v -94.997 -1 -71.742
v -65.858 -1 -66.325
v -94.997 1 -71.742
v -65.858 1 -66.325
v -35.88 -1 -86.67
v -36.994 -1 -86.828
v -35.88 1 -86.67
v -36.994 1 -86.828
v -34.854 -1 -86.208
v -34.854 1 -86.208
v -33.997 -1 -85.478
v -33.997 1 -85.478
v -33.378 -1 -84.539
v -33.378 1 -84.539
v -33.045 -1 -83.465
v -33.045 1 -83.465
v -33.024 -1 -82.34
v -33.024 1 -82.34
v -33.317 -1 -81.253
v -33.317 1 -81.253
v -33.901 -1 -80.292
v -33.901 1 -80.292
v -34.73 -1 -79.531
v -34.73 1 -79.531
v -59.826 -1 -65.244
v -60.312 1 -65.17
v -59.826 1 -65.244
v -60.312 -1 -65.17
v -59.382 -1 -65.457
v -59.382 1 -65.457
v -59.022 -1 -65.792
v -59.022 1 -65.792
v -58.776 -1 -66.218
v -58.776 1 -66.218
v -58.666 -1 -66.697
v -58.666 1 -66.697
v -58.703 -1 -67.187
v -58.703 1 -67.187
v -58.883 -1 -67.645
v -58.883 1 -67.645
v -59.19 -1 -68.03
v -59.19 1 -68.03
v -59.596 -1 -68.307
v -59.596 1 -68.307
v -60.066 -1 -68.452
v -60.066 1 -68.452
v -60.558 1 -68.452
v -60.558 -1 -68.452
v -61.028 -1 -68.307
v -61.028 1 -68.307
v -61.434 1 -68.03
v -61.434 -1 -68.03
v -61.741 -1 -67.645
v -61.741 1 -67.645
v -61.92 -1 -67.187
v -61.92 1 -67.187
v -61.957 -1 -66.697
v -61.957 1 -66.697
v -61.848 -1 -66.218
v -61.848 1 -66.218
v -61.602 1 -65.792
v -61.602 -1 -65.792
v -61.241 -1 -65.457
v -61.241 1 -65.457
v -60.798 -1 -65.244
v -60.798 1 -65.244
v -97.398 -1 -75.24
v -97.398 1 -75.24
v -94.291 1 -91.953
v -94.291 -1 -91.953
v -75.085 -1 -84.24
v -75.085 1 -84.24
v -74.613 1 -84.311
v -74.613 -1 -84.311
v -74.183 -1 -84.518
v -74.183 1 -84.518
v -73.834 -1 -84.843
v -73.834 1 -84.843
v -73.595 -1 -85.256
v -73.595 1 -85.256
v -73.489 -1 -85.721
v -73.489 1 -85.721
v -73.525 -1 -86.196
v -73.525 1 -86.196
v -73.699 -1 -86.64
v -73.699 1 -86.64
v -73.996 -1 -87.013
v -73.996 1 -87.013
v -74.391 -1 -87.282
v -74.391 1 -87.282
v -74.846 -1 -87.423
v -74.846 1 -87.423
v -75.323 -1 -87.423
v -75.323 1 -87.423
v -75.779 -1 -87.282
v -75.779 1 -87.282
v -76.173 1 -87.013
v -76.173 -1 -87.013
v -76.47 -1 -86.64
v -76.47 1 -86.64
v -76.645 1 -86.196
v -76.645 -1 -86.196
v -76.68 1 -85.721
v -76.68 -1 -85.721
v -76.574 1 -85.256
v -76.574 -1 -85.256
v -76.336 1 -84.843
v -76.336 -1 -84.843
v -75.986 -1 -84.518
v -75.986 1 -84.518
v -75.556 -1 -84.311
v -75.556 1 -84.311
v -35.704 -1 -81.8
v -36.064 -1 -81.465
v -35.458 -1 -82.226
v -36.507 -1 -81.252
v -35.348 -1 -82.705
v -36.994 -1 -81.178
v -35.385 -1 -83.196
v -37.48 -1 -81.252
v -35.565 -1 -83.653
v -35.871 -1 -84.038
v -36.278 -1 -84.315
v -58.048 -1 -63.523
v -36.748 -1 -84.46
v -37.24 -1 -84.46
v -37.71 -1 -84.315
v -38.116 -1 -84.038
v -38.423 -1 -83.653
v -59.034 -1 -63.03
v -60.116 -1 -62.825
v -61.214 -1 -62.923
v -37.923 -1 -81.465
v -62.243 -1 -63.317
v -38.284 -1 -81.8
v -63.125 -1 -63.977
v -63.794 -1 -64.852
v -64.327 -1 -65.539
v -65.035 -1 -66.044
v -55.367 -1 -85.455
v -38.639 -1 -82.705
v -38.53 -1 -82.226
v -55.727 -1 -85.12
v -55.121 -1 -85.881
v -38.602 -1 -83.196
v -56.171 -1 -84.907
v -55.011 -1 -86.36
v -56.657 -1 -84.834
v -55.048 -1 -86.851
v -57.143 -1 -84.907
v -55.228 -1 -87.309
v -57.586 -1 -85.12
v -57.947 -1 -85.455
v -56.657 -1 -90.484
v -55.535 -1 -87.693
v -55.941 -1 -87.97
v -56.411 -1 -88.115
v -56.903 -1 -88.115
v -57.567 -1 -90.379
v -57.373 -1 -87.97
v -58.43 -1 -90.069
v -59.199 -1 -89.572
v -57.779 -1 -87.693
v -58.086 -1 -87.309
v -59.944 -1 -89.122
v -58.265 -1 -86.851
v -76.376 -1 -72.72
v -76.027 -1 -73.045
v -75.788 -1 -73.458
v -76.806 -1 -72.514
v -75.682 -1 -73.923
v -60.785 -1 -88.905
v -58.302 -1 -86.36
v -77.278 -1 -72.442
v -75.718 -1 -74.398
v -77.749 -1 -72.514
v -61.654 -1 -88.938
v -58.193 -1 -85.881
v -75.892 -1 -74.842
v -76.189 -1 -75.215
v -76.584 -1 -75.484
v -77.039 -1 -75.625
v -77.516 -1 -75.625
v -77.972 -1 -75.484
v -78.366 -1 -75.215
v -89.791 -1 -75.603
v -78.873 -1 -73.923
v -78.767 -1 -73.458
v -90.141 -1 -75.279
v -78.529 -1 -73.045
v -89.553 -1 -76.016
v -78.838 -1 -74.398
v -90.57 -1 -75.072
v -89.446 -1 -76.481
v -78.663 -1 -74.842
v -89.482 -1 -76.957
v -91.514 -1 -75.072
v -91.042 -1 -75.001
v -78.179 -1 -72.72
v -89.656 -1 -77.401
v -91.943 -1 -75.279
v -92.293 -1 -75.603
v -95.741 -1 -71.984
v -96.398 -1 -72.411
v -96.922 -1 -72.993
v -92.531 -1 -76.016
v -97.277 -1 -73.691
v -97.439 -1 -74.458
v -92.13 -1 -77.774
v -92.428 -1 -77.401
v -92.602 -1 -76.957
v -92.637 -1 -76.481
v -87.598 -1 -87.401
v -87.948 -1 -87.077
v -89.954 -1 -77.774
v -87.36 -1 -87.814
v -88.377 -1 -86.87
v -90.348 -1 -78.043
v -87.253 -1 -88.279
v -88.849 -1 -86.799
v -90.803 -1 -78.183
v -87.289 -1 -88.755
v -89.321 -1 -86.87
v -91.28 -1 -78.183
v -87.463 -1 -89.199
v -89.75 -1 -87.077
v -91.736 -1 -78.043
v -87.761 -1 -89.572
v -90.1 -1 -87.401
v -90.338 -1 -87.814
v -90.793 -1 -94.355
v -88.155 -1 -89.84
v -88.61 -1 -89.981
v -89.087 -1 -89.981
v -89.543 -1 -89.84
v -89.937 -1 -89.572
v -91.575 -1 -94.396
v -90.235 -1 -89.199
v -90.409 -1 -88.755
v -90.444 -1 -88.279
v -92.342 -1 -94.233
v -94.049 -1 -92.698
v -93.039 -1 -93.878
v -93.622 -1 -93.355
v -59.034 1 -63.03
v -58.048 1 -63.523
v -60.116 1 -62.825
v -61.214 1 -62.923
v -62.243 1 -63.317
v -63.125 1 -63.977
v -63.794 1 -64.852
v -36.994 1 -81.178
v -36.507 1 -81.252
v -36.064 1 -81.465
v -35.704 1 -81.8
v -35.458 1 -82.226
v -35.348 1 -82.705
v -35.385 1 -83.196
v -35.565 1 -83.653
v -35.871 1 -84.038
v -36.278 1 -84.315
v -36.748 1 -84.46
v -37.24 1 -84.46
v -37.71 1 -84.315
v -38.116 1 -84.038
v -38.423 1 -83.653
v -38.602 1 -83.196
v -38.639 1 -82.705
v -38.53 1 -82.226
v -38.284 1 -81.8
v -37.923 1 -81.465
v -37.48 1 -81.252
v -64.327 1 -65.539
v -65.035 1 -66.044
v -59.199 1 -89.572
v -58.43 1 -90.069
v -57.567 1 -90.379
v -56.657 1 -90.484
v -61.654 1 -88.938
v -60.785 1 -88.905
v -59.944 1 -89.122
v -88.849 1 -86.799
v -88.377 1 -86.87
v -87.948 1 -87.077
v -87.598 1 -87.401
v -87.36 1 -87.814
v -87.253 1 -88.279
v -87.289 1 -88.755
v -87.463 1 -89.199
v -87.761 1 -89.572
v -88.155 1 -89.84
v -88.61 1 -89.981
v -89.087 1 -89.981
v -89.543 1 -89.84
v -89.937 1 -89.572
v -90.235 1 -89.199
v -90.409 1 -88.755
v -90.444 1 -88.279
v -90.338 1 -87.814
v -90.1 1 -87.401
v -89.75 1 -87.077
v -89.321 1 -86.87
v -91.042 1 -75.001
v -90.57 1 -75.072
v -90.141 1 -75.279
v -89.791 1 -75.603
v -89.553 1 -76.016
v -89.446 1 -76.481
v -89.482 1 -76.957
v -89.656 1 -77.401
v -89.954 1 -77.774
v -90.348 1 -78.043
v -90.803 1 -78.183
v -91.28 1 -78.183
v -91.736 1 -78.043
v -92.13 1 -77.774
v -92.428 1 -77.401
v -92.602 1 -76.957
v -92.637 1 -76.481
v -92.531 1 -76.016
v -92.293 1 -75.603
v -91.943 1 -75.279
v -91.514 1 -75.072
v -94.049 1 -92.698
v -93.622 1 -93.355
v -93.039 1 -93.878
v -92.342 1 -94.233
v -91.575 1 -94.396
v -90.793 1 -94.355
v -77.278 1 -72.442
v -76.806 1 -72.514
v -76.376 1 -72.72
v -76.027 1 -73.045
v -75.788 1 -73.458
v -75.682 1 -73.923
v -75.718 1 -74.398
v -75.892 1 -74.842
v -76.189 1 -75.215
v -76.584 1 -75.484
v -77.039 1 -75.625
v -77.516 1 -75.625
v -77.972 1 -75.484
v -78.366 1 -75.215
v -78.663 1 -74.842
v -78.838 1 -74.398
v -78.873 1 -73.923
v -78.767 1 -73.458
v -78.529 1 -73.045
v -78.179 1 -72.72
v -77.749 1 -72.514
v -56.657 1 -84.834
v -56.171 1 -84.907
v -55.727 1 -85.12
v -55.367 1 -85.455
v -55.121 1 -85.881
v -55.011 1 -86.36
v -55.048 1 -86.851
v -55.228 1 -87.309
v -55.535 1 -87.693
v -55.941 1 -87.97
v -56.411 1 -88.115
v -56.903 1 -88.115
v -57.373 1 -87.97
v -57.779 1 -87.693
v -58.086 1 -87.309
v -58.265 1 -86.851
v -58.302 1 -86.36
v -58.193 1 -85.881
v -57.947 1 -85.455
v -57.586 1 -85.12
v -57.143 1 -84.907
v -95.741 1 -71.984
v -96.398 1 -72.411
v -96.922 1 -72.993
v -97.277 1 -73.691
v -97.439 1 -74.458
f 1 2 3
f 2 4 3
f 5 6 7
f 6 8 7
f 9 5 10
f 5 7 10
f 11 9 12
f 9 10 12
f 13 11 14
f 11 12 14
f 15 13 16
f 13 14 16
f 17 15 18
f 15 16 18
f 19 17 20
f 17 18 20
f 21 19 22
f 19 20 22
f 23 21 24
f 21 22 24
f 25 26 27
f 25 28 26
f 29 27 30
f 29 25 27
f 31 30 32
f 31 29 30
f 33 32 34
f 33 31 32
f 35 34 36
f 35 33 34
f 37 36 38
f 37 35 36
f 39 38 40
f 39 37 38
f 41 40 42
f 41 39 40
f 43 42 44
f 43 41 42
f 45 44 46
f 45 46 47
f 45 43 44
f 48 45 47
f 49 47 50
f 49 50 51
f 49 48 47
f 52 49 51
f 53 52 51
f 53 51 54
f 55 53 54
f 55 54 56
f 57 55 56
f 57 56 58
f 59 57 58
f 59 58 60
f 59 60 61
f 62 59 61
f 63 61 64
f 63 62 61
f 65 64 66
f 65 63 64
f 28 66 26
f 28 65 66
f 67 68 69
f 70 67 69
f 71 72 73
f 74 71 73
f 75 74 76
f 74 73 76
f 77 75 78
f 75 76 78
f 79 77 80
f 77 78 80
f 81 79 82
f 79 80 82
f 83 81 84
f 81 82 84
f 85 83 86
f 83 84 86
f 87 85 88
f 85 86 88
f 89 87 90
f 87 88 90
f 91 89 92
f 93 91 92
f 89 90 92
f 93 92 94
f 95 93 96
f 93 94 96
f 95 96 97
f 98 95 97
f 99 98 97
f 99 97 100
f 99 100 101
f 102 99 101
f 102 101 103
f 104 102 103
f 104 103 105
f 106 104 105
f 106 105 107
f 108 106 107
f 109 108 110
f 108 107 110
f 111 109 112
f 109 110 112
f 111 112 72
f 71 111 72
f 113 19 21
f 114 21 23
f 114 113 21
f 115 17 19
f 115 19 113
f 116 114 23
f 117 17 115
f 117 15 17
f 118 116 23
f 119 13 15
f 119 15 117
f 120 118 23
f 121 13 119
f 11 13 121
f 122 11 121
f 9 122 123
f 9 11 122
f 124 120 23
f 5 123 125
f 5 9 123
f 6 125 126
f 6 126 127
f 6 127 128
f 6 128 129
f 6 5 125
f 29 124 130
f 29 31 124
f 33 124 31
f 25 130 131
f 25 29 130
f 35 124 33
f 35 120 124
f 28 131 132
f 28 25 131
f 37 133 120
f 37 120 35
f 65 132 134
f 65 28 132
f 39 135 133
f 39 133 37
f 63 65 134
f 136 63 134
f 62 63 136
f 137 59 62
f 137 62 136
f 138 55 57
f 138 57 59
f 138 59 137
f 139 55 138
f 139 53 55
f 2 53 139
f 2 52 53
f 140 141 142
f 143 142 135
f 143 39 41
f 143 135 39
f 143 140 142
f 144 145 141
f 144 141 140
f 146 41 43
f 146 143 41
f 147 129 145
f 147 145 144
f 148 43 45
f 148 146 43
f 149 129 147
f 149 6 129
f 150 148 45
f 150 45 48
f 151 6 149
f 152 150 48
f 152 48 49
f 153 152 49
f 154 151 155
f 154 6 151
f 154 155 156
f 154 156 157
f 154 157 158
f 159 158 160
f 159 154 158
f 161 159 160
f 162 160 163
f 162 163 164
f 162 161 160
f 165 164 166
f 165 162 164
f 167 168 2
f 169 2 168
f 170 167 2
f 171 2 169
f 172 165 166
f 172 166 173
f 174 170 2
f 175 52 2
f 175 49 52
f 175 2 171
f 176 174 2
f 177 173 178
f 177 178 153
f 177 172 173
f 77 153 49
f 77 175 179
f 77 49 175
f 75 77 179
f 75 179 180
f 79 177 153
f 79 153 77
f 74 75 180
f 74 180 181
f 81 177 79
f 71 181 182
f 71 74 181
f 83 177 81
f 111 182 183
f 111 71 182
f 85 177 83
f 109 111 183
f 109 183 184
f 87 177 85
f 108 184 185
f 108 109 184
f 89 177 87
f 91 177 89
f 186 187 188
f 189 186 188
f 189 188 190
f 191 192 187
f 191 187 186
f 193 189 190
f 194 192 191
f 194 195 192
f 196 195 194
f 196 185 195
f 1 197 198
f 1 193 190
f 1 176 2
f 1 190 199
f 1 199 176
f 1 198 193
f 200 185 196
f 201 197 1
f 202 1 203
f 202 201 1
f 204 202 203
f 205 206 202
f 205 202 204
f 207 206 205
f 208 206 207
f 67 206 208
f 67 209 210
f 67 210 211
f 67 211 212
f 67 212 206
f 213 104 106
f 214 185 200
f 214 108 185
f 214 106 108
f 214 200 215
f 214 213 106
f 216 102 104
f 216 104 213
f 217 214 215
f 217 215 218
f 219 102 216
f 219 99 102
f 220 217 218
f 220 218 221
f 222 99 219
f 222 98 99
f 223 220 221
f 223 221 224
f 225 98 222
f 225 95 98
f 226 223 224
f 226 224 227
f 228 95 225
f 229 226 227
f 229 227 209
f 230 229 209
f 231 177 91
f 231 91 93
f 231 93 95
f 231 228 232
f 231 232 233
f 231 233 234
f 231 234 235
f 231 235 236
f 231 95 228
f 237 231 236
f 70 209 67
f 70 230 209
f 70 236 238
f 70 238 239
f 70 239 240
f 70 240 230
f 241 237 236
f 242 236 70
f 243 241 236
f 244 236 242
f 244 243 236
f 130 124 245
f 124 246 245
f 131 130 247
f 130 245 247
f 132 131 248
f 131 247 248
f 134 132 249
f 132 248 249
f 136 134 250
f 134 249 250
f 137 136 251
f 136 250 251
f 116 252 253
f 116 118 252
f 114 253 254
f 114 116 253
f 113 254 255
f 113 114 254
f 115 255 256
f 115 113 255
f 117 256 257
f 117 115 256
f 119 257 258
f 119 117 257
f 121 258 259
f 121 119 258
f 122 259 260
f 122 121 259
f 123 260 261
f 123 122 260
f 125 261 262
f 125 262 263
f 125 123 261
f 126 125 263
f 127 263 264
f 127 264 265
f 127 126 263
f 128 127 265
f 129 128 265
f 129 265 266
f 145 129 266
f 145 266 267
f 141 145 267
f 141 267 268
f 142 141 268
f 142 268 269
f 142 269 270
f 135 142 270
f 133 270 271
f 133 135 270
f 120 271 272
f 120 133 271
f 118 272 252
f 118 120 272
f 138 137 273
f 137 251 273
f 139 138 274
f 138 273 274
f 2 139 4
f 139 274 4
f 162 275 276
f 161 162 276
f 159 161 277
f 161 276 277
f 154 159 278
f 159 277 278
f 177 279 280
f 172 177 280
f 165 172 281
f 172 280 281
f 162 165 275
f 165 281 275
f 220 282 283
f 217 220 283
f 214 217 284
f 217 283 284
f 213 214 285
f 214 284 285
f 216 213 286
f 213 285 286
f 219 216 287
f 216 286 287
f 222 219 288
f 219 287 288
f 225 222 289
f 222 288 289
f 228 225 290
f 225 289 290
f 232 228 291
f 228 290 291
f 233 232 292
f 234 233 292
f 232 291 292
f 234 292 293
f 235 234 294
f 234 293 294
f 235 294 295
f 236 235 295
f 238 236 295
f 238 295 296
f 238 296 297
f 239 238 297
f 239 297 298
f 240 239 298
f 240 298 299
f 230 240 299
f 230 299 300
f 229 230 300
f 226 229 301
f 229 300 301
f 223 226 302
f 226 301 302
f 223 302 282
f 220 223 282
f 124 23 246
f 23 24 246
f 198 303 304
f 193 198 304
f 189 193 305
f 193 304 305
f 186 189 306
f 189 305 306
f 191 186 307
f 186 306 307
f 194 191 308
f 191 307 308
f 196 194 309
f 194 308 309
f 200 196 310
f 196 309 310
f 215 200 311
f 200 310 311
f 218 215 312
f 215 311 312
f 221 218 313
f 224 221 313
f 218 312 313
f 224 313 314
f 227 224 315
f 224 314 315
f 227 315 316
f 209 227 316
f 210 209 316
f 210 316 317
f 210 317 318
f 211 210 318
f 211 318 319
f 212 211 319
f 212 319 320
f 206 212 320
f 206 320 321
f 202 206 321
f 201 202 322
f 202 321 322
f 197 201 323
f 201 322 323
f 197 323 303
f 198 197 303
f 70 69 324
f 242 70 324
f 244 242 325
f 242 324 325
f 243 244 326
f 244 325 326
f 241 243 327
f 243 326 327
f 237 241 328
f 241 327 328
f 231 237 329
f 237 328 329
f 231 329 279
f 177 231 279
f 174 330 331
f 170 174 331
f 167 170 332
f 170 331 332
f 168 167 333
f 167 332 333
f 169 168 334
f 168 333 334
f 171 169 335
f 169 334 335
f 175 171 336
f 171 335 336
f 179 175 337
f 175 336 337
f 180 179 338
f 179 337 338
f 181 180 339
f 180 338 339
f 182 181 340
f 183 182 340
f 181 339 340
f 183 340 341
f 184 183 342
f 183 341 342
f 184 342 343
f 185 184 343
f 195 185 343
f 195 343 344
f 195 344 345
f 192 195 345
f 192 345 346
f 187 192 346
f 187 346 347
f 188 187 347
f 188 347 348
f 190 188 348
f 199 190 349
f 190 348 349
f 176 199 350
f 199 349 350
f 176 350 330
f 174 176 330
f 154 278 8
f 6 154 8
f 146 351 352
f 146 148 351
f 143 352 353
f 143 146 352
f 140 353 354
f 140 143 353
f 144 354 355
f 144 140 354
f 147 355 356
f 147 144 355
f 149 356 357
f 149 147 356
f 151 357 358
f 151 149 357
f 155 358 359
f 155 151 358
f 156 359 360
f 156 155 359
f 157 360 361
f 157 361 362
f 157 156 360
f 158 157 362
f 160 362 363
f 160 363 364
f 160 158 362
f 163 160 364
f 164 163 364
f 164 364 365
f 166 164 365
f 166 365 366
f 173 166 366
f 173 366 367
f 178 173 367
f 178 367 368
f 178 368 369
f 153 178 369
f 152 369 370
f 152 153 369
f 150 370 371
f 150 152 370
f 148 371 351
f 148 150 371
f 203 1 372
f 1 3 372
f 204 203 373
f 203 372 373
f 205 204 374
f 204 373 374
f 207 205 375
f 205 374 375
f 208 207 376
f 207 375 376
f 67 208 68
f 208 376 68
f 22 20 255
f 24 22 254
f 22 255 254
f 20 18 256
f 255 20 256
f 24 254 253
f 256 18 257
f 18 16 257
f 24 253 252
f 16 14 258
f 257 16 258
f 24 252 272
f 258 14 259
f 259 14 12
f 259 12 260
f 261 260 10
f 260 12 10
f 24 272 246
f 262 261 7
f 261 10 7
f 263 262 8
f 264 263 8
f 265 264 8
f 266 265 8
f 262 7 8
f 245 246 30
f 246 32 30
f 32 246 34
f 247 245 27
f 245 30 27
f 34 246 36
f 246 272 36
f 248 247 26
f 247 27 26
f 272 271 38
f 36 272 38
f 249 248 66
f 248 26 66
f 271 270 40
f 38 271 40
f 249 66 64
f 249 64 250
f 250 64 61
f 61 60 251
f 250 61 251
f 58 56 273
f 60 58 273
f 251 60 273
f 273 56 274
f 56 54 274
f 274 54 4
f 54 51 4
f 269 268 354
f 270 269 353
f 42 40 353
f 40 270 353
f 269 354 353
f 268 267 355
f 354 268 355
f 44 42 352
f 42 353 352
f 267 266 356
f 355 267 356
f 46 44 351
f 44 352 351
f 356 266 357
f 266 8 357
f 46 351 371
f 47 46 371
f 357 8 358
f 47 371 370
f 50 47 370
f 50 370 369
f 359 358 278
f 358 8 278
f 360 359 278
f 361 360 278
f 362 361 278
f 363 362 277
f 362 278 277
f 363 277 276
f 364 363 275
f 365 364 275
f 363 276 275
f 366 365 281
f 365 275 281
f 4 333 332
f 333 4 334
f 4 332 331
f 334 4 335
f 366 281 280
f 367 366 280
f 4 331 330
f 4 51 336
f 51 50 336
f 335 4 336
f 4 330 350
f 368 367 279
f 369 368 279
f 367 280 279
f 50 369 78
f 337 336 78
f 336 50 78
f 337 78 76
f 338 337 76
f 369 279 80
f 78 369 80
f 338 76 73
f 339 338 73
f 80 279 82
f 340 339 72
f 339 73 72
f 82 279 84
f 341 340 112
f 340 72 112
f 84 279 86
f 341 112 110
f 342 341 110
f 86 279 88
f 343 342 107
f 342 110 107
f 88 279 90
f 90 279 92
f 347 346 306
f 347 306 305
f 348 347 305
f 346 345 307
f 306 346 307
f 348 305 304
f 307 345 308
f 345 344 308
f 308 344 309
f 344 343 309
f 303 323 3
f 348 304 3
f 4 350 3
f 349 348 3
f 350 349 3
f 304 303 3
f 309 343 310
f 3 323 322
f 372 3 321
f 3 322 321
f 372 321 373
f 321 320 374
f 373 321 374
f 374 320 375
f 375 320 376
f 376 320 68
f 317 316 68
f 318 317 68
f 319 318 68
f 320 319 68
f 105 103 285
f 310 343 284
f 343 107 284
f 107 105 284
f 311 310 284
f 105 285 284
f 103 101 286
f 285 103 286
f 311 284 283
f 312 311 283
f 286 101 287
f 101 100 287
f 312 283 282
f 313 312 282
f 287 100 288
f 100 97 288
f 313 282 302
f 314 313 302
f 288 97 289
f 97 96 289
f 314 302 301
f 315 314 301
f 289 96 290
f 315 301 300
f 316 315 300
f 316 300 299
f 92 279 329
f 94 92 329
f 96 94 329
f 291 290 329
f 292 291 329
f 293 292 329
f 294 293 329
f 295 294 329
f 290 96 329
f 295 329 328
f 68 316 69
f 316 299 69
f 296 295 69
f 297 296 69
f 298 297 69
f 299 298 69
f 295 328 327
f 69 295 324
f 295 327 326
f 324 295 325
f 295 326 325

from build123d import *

# Parameters (mm, degrees)
SKETCH1_R           = 1.650000007
BOSS_EXTRUDE1_DEPTH = 1
SKETCH7_R           = 1.6
CUT_EXTRUDE2_DEPTH  = 2


with BuildPart() as part:
    # Sketch1 → Boss-Extrude1 (new, symmetric)
    with BuildSketch(Plane(origin=(0, 0, 0), x_dir=(1, 0, 0), z_dir=(0, 1, 0))):
        with BuildLine():
            Line((-56.656859897, 90.483506167), (-36.993673105, 86.828497938))
            ThreePointArc((-36.993673105, 86.828497938), (-33.173282872, 84.013663947), (-34.729774781, 79.530807173))
            Line((-34.729774781, 79.530807173), (-58.047969803, 63.522628609))
            ThreePointArc((-58.047969803, 63.522628609), (-61.213536363, 62.923269927), (-63.79414326, 64.852132418))
            ThreePointArc((-63.79414326, 64.852132418), (-64.662572796, 65.817505246), (-65.857598376, 66.32547022))
            Line((-65.857598376, 66.32547022), (-94.996570641, 71.741844715))
            ThreePointArc((-94.996570641, 71.741844715), (-96.92158748, 72.993398991), (-97.397797425, 75.239573968))
            Line((-97.397797425, 75.239573968), (-94.29104043, 91.953282742))
            ThreePointArc((-94.29104043, 91.953282742), (-93.039486154, 93.878299581), (-90.793311177, 94.354509526))
            Line((-90.793311177, 94.354509526), (-61.654338999, 88.938135048))
            ThreePointArc((-61.654338999, 88.938135048), (-60.356600681, 88.982743171), (-59.199275822, 89.571567253))
            ThreePointArc((-59.199275822, 89.571567253), (-58.007370108, 90.248625312), (-56.656859897, 90.483506167))
        make_face()
        with Locations(Location((-56.656859897, 86.483506167, 0), (0, 0, 270))):
            Circle(SKETCH1_R, mode=Mode.SUBTRACT)
        with Locations(Location((-36.993673105, 82.828497938, 0), (0, 0, 270))):
            Circle(SKETCH1_R, mode=Mode.SUBTRACT)
        with Locations(Location((-60.311868127, 66.820319374, 0), (0, 0, 270))):
            Circle(SKETCH1_R, mode=Mode.SUBTRACT)
    extrude(amount=BOSS_EXTRUDE1_DEPTH, both=True)

    # Sketch7 → Cut-Extrude2 (cut)
    with BuildSketch(Plane(origin=(0, 1, 0), x_dir=(1, 0, 0), z_dir=(0, 1, 0))):
        with Locations(Location((-88.848960421, 88.398881924, 0), (0, 0, 270))):
            Circle(SKETCH7_R)
        with Locations(Location((-91.041965359, 76.600969848, 0), (0, 0, 270))):
            Circle(SKETCH7_R)
        with Locations(Location((-75.084729666, 85.840376163, 0), (0, 0, 270))):
            Circle(SKETCH7_R)
        with Locations(Location((-77.277734604, 74.042464088, 0), (0, 0, 270))):
            Circle(SKETCH7_R)
    extrude(amount=-CUT_EXTRUDE2_DEPTH, mode=Mode.SUBTRACT)


solid = part.part
